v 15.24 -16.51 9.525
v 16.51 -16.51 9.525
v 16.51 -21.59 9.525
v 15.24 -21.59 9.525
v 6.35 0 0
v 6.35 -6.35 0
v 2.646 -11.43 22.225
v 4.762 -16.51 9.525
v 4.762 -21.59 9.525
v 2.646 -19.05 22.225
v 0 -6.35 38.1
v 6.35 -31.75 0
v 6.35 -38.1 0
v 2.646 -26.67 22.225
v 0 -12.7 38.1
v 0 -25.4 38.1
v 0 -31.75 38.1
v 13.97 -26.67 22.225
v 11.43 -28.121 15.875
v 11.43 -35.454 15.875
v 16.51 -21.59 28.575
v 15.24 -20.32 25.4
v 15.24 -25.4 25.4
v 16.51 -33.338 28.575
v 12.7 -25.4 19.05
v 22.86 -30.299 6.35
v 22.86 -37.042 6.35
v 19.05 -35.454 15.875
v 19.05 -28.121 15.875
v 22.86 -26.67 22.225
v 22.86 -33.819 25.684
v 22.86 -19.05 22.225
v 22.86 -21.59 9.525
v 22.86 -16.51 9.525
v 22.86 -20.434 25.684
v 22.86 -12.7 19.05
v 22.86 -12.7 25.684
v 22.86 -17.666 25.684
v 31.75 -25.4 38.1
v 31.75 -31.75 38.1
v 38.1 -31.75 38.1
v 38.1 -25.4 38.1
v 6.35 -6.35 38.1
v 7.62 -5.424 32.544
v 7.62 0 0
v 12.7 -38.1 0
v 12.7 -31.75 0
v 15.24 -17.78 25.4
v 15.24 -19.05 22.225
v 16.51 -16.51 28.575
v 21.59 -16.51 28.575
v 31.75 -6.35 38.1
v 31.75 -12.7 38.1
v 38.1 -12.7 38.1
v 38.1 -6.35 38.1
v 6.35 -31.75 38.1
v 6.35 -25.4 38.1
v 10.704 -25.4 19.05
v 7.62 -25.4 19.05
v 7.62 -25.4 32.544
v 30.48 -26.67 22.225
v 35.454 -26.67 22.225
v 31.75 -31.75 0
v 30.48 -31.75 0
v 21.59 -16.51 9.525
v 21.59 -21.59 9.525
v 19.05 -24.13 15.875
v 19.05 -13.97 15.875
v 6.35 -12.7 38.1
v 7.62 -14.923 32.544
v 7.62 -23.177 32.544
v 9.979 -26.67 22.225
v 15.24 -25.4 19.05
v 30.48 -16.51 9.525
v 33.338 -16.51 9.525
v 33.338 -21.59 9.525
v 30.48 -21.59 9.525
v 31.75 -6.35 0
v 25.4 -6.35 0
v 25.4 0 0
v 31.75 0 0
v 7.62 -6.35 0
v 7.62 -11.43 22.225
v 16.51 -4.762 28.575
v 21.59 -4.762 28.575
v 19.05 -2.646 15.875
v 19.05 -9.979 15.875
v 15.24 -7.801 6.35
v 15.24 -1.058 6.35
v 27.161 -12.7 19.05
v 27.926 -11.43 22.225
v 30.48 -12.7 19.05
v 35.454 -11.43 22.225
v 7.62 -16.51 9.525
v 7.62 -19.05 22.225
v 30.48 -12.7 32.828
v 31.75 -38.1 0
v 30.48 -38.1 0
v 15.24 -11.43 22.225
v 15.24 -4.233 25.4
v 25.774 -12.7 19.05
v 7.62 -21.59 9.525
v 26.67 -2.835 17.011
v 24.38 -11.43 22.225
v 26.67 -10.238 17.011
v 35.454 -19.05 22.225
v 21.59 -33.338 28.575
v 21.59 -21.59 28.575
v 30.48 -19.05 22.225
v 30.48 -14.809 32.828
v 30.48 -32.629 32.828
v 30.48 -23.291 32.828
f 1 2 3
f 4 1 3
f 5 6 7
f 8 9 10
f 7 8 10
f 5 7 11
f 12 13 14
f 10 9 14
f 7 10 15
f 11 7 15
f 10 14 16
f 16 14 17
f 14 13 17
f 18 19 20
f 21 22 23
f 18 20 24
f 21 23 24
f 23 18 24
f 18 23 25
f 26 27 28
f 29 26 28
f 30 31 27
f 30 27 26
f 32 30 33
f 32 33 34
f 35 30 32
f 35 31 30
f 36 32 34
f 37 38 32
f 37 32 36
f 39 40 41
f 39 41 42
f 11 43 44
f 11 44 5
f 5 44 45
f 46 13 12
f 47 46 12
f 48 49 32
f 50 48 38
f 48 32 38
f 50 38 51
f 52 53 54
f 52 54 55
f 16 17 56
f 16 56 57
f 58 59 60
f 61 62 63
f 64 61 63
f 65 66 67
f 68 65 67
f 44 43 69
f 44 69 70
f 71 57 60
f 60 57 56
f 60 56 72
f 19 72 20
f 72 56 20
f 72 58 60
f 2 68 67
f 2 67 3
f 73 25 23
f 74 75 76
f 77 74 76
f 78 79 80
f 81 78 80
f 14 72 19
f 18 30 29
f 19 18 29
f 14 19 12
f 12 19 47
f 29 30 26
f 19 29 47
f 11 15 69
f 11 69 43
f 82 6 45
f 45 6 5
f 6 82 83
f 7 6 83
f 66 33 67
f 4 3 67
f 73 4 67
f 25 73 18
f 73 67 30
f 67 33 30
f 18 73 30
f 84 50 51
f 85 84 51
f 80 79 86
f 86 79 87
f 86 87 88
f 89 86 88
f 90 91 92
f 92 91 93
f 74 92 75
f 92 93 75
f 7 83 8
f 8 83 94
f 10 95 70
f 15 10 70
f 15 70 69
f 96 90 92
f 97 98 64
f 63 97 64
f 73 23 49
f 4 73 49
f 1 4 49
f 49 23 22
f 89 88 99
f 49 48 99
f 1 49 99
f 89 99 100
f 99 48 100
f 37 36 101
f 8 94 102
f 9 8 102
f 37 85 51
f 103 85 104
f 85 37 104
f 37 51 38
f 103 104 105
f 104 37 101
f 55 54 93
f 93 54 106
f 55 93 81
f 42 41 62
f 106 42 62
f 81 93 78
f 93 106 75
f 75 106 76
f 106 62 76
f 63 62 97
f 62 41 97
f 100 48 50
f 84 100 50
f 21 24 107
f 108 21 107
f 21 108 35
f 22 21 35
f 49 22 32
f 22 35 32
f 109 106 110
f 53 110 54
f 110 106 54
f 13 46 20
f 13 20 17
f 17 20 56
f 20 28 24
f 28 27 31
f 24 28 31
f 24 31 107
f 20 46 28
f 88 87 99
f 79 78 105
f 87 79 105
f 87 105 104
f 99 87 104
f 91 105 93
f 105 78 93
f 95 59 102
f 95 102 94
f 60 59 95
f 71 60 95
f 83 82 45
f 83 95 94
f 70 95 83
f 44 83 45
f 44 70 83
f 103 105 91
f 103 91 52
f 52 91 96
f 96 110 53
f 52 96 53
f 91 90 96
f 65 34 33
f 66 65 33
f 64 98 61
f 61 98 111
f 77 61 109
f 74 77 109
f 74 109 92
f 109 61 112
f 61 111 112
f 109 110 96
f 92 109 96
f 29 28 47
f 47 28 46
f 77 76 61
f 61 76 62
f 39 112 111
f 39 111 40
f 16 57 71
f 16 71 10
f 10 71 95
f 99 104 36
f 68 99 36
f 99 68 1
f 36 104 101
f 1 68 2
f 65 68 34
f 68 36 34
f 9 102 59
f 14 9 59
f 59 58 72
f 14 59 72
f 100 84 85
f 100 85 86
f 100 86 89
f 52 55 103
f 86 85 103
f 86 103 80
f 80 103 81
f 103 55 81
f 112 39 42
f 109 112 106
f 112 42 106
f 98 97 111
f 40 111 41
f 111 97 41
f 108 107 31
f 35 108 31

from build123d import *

# Parameters (mm, degrees)
F0_W      = 38.1
F0_H      = 38.1
F1_DEPTH  = 38.1
F6_DEPTH  = 38.1
F8_DEPTH  = 38.1
F9_W      = 7.62
F9_H      = 25.4
F10_DEPTH = 38.1


with BuildPart() as f1:
    # F0 (on Right) → F1 (new body)
    with BuildSketch(Plane.YZ):
        with Locations((-19.05, 19.05)):
            Rectangle(F0_W, F0_H)
    extrude(amount=F1_DEPTH)

    # F5 (on offset) → F6 (cut)
    with BuildSketch(Plane.XZ.offset(38.1)):
        Polygon((31.75, 38.1), (6.35, 38.1), (11.43, 15.875), (16.51, 28.575), (21.59, 28.575), (26.67, 17.011002), align=None)
        Polygon((0, 38.1), (0, 0), (6.35, 0), align=None)
        Polygon((38.1, 38.1), (31.75, 0), (38.1, 0), align=None)
        Polygon((19.05, 15.875), (12.7, 0), (25.4, 0), align=None)
    extrude(amount=-F6_DEPTH, mode=Mode.SUBTRACT)

    # F7 (on offset) → F8 (cut)
    with BuildSketch(Plane.YZ.offset(38.1)):
        Polygon((-38.1, 38.1), (-38.1, 0), (-31.75, 38.1), align=None)
        Polygon((-19.05, 22.225), (-12.7, 38.1), (-25.4, 38.1), align=None)
        Polygon((-31.75, 0), (-6.35, 0), (-11.43, 22.225), (-16.51, 9.525), (-21.59, 9.525), (-26.67, 22.225), align=None)
        Polygon((-6.35, 38.1), (0, 0), (0, 38.1), align=None)
    extrude(amount=-F8_DEPTH, mode=Mode.SUBTRACT)

    # F9 (on offset) → F10 (cut)
    with BuildSketch(Plane.XY.offset(38.1)):
        with Locations((11.43, -12.7)):
            Rectangle(F9_W, F9_H)
        with Locations((26.67, -25.4)):
            Rectangle(F9_W, F9_H)
    extrude(amount=-F10_DEPTH, mode=Mode.SUBTRACT)


solid = f1.part
